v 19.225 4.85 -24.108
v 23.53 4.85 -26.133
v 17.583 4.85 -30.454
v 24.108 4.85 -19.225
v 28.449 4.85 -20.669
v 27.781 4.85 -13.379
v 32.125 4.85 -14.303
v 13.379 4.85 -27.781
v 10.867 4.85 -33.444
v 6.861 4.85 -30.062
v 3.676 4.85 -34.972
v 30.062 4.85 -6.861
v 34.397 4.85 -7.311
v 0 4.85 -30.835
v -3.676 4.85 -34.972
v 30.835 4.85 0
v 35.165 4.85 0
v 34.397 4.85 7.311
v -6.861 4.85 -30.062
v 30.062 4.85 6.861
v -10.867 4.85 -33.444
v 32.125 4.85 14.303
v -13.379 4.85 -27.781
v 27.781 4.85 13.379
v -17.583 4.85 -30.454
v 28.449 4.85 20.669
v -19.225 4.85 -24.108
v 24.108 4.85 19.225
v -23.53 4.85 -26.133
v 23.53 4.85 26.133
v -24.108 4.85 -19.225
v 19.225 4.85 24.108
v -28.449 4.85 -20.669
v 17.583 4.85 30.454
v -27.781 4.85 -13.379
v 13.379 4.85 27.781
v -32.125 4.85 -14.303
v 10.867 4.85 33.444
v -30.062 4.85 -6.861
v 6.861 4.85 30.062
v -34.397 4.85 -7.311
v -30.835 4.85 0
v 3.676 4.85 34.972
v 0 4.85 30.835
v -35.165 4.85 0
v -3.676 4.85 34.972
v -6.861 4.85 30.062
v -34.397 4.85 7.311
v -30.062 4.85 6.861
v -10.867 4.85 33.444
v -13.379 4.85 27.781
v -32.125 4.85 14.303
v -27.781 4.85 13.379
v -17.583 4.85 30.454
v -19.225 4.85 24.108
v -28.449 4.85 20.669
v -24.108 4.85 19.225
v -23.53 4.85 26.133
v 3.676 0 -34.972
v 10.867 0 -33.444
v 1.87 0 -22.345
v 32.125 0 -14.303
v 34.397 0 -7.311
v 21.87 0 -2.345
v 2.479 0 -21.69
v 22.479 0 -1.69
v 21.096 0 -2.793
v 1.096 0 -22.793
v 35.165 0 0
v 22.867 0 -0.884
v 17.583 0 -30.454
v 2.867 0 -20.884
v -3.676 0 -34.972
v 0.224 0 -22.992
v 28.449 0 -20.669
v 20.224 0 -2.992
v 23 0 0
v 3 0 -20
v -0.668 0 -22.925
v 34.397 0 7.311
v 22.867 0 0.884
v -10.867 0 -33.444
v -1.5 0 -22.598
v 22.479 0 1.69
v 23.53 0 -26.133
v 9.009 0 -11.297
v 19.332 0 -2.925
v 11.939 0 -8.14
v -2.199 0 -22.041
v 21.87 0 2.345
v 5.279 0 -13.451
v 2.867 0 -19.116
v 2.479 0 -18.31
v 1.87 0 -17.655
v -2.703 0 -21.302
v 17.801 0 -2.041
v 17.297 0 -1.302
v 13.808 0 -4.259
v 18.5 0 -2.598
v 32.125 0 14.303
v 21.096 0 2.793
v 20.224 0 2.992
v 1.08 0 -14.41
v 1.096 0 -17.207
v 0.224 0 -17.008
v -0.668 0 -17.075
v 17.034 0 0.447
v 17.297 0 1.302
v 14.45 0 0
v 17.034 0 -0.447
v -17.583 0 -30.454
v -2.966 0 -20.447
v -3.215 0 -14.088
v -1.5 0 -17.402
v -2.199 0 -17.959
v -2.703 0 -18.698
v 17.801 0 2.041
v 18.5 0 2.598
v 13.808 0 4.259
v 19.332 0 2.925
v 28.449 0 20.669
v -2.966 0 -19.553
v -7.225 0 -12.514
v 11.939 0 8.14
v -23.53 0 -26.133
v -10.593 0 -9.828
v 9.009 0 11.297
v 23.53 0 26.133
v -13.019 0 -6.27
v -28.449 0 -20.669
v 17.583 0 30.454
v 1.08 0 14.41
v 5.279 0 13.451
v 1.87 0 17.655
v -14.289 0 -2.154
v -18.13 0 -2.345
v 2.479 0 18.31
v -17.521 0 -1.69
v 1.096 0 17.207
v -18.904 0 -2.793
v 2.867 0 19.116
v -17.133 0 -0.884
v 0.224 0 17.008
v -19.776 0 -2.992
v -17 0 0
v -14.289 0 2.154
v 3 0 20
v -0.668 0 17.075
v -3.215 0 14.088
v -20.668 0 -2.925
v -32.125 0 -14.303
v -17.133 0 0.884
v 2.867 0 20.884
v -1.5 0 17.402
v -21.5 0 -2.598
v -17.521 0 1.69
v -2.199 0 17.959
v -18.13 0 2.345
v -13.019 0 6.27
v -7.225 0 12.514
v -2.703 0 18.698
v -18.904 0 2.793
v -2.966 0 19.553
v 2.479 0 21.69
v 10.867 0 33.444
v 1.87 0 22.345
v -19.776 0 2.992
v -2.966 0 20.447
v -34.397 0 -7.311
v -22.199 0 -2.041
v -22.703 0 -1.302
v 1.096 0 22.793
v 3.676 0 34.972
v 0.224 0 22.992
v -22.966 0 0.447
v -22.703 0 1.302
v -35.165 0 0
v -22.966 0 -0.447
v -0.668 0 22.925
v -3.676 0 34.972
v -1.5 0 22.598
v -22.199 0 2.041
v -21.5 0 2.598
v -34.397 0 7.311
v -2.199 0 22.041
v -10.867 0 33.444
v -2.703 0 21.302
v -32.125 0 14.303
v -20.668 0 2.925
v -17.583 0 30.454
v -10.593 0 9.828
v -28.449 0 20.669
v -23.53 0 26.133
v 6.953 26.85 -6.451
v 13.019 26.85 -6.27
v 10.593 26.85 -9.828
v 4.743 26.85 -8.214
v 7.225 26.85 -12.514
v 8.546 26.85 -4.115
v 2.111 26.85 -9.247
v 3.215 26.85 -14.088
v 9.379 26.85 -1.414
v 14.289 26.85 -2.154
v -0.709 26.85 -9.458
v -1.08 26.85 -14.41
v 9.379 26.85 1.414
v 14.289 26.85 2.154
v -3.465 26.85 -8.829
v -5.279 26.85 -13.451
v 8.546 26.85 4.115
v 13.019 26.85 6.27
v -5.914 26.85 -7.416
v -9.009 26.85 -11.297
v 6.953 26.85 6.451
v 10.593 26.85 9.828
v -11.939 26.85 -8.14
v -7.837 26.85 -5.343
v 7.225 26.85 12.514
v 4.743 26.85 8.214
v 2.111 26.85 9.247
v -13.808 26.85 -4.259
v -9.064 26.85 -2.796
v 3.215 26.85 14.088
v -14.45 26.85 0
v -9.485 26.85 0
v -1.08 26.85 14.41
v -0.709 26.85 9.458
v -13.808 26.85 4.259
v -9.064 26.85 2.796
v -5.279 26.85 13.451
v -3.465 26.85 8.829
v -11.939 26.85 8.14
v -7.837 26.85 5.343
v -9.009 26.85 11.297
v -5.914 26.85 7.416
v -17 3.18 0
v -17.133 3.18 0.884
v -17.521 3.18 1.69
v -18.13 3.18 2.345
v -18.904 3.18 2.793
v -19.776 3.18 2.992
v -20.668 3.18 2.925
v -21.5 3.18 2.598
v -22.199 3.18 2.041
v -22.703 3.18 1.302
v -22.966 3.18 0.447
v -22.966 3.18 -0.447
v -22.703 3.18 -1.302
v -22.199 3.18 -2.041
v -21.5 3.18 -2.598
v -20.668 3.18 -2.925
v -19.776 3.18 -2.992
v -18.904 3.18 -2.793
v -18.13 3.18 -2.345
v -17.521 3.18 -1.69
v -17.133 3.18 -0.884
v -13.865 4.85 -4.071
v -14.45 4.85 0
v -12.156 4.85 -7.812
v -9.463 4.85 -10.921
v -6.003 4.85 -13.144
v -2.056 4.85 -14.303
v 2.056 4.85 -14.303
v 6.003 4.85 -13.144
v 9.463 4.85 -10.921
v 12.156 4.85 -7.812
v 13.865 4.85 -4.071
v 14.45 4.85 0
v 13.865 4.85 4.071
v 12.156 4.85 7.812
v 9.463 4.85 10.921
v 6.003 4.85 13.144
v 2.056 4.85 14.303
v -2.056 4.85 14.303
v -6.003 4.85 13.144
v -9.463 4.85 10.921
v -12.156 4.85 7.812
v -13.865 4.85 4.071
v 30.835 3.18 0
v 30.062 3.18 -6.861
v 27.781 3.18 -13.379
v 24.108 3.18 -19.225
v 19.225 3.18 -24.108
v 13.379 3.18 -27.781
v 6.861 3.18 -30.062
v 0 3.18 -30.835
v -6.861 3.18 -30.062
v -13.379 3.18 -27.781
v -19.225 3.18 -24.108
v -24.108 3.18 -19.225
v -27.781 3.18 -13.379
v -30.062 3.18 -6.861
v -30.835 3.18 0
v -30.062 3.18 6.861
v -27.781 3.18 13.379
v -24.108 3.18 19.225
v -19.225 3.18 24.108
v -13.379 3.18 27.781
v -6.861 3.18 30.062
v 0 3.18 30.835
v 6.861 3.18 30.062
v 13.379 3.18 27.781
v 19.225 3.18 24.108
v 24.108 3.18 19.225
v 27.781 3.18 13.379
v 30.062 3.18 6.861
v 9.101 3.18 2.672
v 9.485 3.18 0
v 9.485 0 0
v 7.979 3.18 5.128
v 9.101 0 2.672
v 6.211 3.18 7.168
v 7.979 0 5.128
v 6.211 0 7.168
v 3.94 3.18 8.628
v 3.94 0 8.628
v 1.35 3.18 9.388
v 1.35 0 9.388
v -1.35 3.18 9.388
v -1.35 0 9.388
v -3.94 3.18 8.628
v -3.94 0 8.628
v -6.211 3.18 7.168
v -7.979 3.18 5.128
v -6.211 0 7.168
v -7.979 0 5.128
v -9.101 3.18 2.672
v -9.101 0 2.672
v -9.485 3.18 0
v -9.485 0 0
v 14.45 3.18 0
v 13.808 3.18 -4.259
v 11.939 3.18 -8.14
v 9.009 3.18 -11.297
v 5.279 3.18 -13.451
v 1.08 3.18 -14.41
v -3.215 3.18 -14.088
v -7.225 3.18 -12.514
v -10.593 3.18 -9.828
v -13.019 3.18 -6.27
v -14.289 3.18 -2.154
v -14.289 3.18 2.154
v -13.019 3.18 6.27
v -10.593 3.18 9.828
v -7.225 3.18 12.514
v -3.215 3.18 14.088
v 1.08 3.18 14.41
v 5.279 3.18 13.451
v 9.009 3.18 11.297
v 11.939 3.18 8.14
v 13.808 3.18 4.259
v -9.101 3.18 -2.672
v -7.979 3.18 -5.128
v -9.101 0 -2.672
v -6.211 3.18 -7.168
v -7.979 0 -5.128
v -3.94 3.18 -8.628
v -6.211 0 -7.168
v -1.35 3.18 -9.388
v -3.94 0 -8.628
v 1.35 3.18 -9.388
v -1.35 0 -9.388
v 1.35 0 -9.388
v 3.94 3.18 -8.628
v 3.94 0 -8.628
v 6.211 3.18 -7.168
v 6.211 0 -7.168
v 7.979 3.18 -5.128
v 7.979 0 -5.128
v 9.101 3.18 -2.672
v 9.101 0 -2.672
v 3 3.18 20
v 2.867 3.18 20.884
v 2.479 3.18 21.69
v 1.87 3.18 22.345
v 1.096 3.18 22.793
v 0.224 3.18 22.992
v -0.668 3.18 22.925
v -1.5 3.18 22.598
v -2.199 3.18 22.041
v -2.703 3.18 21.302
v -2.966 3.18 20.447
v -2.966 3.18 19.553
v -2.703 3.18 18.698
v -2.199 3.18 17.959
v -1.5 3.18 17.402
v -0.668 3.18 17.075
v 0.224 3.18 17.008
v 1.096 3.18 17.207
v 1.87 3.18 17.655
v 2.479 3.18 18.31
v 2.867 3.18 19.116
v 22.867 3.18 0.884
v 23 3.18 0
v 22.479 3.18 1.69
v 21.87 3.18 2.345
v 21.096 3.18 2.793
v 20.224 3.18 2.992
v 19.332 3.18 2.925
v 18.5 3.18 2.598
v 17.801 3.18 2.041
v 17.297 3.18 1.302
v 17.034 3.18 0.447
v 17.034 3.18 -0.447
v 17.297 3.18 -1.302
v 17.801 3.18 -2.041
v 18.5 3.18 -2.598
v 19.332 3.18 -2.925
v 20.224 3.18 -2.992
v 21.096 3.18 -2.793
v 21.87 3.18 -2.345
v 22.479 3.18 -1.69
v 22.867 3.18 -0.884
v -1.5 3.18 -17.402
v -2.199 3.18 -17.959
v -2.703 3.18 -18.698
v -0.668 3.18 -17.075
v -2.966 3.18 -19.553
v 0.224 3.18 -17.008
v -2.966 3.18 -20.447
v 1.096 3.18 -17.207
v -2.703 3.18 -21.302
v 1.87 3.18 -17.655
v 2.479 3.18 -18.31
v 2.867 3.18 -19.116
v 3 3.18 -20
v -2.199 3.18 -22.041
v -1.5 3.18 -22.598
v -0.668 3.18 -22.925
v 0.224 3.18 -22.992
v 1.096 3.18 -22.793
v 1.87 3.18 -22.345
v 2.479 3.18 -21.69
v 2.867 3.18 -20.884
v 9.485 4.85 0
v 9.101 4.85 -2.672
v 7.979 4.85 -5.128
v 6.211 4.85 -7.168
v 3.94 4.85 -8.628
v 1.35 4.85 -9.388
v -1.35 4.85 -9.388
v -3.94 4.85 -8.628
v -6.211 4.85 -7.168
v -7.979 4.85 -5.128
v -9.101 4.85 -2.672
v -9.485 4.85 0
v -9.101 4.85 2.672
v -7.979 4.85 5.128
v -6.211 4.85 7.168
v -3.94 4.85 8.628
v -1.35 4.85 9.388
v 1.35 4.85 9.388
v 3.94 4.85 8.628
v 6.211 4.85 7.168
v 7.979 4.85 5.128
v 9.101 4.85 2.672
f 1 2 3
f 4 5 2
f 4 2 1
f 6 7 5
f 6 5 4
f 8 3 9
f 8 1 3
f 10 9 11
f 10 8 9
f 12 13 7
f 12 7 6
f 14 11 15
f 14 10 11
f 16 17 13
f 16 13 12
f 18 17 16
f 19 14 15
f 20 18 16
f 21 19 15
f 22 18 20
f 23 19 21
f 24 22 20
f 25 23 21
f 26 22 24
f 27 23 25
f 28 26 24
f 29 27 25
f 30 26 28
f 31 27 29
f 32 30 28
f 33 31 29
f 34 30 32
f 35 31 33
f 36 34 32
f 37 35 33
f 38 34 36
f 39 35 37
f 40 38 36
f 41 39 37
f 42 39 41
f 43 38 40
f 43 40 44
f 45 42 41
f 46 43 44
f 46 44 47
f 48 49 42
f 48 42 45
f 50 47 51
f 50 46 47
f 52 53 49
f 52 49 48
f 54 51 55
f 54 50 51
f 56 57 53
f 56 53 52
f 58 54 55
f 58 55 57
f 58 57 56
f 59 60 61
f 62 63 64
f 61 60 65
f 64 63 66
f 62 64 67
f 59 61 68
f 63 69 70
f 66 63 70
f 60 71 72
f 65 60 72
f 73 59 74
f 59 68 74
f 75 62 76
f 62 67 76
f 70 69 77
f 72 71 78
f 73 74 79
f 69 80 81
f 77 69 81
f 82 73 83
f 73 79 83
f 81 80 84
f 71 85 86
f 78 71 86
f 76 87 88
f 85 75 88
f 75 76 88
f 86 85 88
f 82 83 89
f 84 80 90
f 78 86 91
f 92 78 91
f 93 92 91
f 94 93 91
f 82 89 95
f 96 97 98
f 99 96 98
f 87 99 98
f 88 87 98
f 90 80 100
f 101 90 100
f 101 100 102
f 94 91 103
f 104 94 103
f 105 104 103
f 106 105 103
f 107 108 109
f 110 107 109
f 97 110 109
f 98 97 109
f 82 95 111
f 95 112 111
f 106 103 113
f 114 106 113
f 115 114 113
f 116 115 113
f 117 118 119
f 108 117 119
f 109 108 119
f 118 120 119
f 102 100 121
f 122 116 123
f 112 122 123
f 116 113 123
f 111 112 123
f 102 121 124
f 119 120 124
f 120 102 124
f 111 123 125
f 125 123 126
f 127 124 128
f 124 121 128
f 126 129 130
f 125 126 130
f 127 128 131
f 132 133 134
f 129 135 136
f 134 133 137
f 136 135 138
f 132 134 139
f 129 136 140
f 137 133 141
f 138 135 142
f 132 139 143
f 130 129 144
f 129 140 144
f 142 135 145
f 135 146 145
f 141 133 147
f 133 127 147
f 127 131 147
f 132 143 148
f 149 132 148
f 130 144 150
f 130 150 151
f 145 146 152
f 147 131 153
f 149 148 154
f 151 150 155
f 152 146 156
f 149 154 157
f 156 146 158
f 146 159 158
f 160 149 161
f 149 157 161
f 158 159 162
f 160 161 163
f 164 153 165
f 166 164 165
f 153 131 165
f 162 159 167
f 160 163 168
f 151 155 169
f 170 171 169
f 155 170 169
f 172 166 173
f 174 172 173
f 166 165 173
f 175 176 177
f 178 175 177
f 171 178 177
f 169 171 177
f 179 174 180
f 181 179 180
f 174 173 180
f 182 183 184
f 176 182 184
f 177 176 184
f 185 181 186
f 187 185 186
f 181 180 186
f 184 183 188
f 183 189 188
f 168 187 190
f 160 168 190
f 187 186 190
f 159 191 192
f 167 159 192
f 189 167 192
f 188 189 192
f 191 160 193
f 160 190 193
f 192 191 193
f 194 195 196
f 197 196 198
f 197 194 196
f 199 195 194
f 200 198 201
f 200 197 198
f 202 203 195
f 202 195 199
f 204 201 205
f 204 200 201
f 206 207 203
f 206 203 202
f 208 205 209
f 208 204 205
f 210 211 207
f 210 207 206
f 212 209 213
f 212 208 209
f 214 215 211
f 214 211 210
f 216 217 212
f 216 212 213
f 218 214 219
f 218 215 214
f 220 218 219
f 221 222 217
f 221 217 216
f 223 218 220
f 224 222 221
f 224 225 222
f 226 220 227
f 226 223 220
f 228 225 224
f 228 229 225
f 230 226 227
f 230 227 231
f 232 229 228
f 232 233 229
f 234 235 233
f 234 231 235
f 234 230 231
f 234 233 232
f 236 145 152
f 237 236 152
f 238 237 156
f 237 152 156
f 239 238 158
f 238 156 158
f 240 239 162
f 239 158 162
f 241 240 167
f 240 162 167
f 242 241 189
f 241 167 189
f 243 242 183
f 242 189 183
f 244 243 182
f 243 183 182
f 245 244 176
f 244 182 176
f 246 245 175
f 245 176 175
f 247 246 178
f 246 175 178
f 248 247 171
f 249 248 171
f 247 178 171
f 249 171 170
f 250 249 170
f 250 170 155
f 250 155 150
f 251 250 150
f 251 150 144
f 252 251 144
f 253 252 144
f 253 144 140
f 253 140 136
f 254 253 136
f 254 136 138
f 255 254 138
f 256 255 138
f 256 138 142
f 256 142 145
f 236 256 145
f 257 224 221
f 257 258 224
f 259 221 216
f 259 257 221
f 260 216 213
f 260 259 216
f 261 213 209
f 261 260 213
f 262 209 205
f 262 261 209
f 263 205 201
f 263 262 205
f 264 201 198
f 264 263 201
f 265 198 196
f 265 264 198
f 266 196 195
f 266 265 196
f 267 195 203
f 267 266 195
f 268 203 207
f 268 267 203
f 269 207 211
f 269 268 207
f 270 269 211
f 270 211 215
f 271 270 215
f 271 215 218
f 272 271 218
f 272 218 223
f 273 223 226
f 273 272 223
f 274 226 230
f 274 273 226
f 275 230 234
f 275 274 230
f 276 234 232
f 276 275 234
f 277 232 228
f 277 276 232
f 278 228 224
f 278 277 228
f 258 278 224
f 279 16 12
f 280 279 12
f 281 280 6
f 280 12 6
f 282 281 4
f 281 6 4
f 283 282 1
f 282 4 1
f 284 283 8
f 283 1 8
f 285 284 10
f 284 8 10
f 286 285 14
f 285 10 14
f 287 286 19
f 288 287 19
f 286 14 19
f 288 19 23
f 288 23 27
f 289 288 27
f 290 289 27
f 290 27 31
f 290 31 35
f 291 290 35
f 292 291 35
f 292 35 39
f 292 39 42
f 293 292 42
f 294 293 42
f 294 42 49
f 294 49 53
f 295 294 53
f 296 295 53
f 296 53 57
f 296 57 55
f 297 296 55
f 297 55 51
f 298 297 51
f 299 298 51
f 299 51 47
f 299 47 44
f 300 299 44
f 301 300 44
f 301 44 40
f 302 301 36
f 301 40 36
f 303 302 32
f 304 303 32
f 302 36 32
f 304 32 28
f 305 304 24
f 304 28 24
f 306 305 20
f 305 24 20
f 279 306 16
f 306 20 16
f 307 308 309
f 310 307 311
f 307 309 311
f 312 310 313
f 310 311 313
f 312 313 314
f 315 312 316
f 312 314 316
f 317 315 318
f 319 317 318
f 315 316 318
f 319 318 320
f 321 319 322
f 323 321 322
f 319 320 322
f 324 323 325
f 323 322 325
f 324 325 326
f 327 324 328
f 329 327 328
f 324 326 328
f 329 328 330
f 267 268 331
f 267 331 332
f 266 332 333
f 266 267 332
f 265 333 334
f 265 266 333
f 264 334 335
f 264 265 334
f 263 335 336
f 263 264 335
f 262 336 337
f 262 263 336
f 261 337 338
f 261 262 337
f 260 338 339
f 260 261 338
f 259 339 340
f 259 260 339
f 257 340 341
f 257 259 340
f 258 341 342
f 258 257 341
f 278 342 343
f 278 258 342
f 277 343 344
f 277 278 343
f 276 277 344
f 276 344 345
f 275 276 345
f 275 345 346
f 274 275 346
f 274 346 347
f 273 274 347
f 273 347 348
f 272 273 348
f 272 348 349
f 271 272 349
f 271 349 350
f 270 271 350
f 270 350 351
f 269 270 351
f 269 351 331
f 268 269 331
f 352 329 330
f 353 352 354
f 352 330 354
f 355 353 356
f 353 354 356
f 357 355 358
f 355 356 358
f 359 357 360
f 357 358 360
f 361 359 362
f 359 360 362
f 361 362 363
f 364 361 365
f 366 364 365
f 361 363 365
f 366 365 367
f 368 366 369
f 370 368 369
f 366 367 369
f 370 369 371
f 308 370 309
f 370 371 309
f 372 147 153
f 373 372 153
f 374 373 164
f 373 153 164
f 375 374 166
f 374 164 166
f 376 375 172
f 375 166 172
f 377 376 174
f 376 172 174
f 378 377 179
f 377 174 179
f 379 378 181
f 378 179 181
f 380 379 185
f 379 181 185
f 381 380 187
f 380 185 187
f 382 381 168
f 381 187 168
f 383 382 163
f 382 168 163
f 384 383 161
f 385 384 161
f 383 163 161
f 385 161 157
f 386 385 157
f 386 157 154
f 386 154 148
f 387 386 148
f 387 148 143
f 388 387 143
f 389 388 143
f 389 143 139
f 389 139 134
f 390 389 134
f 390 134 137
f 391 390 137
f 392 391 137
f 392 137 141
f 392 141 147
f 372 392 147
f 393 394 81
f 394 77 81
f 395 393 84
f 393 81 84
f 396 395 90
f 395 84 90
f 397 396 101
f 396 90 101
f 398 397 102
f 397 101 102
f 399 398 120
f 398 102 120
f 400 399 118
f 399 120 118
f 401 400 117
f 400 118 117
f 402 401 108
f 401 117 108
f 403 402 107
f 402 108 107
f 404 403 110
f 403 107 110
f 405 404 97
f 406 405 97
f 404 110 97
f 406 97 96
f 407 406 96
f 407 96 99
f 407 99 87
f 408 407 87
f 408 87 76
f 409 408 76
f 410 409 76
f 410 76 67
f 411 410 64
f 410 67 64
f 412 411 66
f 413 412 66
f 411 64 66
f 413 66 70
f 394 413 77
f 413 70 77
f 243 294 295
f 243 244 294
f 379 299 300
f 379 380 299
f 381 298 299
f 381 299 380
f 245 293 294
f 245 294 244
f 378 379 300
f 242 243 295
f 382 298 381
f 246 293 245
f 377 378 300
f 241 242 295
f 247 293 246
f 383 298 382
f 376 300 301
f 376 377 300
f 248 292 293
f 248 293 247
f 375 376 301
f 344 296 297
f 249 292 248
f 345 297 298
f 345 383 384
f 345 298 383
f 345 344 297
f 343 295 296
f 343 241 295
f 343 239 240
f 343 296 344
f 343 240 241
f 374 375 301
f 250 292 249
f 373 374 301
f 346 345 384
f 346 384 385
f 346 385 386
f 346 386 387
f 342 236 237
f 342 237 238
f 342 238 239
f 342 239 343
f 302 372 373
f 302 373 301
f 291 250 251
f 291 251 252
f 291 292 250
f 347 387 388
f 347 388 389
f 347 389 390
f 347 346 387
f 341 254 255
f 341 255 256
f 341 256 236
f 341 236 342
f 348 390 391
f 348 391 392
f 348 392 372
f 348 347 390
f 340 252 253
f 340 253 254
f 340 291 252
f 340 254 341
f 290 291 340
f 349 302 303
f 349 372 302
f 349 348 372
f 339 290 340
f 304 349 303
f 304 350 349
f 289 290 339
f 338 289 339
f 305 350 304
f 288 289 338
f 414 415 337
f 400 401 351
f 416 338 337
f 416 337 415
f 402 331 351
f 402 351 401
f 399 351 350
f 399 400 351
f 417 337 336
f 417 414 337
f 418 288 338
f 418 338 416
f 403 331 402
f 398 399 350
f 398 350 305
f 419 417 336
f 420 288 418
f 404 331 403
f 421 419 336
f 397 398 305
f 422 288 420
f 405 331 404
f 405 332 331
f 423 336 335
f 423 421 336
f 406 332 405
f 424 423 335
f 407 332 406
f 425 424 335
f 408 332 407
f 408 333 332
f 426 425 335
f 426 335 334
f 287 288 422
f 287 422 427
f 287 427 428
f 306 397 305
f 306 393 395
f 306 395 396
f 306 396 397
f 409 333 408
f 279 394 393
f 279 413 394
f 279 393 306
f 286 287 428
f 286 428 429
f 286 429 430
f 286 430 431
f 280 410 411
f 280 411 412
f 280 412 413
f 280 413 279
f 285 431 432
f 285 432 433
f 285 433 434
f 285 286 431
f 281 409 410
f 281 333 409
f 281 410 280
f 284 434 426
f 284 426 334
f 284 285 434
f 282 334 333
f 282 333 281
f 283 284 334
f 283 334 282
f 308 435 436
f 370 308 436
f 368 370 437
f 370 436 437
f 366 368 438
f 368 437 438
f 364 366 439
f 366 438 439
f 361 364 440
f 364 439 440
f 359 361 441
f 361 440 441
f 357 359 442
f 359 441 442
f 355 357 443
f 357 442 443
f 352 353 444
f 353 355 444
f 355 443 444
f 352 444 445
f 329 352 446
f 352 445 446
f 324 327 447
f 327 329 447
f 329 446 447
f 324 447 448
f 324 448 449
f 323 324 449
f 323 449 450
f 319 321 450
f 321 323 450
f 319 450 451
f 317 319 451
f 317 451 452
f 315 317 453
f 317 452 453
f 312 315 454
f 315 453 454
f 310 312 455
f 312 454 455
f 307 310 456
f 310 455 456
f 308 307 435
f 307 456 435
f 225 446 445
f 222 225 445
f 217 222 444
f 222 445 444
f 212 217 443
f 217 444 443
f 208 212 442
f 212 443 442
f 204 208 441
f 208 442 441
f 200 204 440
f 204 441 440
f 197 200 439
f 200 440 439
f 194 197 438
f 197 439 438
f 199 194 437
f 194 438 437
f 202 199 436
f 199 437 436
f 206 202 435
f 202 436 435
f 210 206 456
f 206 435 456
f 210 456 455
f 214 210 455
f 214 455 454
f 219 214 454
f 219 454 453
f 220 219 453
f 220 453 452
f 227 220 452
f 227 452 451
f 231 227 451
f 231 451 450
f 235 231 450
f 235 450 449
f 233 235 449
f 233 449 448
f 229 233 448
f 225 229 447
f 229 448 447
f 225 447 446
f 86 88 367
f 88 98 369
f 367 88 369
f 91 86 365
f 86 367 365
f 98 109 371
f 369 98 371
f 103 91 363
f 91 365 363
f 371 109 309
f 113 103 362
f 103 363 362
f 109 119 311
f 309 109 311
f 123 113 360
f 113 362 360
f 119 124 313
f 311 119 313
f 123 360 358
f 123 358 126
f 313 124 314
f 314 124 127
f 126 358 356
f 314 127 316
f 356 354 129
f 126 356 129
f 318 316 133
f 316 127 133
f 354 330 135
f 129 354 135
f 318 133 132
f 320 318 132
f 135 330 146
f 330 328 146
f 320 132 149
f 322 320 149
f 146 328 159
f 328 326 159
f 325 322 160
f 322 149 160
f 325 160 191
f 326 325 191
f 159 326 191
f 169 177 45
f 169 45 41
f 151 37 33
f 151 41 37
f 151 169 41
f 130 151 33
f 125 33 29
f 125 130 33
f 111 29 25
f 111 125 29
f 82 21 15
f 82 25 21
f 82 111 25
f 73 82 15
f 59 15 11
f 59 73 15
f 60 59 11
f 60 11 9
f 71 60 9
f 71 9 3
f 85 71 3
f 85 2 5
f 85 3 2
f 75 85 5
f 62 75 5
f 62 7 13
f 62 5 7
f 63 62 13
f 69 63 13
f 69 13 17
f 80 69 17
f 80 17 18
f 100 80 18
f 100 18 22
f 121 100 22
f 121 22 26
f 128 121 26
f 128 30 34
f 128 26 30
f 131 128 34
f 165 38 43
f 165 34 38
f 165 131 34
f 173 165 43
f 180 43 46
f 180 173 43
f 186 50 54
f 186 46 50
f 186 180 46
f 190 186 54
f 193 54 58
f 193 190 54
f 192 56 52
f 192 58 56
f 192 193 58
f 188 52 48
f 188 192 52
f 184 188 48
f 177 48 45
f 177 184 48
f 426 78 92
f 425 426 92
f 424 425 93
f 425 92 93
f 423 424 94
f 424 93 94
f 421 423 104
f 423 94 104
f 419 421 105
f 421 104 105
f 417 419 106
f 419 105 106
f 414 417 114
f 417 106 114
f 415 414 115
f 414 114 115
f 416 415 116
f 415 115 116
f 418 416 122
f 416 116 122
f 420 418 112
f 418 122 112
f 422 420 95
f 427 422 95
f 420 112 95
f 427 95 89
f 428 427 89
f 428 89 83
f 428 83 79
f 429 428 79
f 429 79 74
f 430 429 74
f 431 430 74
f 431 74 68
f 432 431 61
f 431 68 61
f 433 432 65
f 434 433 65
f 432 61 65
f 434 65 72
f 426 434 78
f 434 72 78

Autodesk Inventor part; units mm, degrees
ref_plane "YZ Plane" through (0, 0, 0) normal (1, 0, 0) x (0, 1, 0)
ref_plane "XZ Plane" through (0, 0, 0) normal (0, 1, 0) x (-1, 0, 0)
ref_plane "XY Plane" through (0, 0, 0) normal (0, 0, 1) x (1, 0, 0)
sketch "Boceto1" plane through (0, 0, 0) normal (0, 1, 0) x (-1, 0, 0)
  circle A0 centre (0, 0) radius 35.165
  circle A1 centre (0, 0) radius 9.485
  circle A2 centre (0, 0) radius 14.45
  dimension "d0" = 70.33
  dimension "d23" = 18.97
  dimension "d24" = 28.9
extrude "Extrusión1" add sketch "Boceto1" along normal blind 26.85 contours A2
extrude "Extrusión2" add sketch "Boceto1" along normal blind 4.85 contours A0
thread "Rosca1" size "M20x2.5" class "6H" standard "ANSI Metric M Profile" full length
sketch "Boceto2" plane through (0, 4.85, 0) normal (0, 1, 0) x (1, 0, 0)
  circle A0 centre (0, 0) radius 30.835
  dimension "d9" = 61.67
extrude "Extrusión3" cut sketch "Boceto2" against normal blind 1.67
sketch "Boceto3" plane through (0, 4.85, 0) normal (0, -1, 0) x (1, 0, 0)
  circle A0 centre (0, 0) radius 14.45 projected
  circle A1 centre (0, 0) radius 9.485 projected
extrude "Extrusión4" add sketch "Boceto3" along normal through all
sketch "Boceto4" plane through (0, 0, 0) normal (0, -1, 0) x (1, 0, 0)
  circle A0 centre (-20, 0) radius 3
  circle A1 centre (0, -20) radius 3
  circle A2 centre (20, 0) radius 3
  circle A3 centre (0, 20) radius 3
  point P0 (0, 0)
  dimension "d14" = 6
  dimension "d15" = 20
  dimension "d16" = 0
  dimension "d19" = 360
extrude "Extrusión5" cut sketch "Boceto4" against normal blind 26.85
properties part number "Flanche" material "PVC, no plastificado"
